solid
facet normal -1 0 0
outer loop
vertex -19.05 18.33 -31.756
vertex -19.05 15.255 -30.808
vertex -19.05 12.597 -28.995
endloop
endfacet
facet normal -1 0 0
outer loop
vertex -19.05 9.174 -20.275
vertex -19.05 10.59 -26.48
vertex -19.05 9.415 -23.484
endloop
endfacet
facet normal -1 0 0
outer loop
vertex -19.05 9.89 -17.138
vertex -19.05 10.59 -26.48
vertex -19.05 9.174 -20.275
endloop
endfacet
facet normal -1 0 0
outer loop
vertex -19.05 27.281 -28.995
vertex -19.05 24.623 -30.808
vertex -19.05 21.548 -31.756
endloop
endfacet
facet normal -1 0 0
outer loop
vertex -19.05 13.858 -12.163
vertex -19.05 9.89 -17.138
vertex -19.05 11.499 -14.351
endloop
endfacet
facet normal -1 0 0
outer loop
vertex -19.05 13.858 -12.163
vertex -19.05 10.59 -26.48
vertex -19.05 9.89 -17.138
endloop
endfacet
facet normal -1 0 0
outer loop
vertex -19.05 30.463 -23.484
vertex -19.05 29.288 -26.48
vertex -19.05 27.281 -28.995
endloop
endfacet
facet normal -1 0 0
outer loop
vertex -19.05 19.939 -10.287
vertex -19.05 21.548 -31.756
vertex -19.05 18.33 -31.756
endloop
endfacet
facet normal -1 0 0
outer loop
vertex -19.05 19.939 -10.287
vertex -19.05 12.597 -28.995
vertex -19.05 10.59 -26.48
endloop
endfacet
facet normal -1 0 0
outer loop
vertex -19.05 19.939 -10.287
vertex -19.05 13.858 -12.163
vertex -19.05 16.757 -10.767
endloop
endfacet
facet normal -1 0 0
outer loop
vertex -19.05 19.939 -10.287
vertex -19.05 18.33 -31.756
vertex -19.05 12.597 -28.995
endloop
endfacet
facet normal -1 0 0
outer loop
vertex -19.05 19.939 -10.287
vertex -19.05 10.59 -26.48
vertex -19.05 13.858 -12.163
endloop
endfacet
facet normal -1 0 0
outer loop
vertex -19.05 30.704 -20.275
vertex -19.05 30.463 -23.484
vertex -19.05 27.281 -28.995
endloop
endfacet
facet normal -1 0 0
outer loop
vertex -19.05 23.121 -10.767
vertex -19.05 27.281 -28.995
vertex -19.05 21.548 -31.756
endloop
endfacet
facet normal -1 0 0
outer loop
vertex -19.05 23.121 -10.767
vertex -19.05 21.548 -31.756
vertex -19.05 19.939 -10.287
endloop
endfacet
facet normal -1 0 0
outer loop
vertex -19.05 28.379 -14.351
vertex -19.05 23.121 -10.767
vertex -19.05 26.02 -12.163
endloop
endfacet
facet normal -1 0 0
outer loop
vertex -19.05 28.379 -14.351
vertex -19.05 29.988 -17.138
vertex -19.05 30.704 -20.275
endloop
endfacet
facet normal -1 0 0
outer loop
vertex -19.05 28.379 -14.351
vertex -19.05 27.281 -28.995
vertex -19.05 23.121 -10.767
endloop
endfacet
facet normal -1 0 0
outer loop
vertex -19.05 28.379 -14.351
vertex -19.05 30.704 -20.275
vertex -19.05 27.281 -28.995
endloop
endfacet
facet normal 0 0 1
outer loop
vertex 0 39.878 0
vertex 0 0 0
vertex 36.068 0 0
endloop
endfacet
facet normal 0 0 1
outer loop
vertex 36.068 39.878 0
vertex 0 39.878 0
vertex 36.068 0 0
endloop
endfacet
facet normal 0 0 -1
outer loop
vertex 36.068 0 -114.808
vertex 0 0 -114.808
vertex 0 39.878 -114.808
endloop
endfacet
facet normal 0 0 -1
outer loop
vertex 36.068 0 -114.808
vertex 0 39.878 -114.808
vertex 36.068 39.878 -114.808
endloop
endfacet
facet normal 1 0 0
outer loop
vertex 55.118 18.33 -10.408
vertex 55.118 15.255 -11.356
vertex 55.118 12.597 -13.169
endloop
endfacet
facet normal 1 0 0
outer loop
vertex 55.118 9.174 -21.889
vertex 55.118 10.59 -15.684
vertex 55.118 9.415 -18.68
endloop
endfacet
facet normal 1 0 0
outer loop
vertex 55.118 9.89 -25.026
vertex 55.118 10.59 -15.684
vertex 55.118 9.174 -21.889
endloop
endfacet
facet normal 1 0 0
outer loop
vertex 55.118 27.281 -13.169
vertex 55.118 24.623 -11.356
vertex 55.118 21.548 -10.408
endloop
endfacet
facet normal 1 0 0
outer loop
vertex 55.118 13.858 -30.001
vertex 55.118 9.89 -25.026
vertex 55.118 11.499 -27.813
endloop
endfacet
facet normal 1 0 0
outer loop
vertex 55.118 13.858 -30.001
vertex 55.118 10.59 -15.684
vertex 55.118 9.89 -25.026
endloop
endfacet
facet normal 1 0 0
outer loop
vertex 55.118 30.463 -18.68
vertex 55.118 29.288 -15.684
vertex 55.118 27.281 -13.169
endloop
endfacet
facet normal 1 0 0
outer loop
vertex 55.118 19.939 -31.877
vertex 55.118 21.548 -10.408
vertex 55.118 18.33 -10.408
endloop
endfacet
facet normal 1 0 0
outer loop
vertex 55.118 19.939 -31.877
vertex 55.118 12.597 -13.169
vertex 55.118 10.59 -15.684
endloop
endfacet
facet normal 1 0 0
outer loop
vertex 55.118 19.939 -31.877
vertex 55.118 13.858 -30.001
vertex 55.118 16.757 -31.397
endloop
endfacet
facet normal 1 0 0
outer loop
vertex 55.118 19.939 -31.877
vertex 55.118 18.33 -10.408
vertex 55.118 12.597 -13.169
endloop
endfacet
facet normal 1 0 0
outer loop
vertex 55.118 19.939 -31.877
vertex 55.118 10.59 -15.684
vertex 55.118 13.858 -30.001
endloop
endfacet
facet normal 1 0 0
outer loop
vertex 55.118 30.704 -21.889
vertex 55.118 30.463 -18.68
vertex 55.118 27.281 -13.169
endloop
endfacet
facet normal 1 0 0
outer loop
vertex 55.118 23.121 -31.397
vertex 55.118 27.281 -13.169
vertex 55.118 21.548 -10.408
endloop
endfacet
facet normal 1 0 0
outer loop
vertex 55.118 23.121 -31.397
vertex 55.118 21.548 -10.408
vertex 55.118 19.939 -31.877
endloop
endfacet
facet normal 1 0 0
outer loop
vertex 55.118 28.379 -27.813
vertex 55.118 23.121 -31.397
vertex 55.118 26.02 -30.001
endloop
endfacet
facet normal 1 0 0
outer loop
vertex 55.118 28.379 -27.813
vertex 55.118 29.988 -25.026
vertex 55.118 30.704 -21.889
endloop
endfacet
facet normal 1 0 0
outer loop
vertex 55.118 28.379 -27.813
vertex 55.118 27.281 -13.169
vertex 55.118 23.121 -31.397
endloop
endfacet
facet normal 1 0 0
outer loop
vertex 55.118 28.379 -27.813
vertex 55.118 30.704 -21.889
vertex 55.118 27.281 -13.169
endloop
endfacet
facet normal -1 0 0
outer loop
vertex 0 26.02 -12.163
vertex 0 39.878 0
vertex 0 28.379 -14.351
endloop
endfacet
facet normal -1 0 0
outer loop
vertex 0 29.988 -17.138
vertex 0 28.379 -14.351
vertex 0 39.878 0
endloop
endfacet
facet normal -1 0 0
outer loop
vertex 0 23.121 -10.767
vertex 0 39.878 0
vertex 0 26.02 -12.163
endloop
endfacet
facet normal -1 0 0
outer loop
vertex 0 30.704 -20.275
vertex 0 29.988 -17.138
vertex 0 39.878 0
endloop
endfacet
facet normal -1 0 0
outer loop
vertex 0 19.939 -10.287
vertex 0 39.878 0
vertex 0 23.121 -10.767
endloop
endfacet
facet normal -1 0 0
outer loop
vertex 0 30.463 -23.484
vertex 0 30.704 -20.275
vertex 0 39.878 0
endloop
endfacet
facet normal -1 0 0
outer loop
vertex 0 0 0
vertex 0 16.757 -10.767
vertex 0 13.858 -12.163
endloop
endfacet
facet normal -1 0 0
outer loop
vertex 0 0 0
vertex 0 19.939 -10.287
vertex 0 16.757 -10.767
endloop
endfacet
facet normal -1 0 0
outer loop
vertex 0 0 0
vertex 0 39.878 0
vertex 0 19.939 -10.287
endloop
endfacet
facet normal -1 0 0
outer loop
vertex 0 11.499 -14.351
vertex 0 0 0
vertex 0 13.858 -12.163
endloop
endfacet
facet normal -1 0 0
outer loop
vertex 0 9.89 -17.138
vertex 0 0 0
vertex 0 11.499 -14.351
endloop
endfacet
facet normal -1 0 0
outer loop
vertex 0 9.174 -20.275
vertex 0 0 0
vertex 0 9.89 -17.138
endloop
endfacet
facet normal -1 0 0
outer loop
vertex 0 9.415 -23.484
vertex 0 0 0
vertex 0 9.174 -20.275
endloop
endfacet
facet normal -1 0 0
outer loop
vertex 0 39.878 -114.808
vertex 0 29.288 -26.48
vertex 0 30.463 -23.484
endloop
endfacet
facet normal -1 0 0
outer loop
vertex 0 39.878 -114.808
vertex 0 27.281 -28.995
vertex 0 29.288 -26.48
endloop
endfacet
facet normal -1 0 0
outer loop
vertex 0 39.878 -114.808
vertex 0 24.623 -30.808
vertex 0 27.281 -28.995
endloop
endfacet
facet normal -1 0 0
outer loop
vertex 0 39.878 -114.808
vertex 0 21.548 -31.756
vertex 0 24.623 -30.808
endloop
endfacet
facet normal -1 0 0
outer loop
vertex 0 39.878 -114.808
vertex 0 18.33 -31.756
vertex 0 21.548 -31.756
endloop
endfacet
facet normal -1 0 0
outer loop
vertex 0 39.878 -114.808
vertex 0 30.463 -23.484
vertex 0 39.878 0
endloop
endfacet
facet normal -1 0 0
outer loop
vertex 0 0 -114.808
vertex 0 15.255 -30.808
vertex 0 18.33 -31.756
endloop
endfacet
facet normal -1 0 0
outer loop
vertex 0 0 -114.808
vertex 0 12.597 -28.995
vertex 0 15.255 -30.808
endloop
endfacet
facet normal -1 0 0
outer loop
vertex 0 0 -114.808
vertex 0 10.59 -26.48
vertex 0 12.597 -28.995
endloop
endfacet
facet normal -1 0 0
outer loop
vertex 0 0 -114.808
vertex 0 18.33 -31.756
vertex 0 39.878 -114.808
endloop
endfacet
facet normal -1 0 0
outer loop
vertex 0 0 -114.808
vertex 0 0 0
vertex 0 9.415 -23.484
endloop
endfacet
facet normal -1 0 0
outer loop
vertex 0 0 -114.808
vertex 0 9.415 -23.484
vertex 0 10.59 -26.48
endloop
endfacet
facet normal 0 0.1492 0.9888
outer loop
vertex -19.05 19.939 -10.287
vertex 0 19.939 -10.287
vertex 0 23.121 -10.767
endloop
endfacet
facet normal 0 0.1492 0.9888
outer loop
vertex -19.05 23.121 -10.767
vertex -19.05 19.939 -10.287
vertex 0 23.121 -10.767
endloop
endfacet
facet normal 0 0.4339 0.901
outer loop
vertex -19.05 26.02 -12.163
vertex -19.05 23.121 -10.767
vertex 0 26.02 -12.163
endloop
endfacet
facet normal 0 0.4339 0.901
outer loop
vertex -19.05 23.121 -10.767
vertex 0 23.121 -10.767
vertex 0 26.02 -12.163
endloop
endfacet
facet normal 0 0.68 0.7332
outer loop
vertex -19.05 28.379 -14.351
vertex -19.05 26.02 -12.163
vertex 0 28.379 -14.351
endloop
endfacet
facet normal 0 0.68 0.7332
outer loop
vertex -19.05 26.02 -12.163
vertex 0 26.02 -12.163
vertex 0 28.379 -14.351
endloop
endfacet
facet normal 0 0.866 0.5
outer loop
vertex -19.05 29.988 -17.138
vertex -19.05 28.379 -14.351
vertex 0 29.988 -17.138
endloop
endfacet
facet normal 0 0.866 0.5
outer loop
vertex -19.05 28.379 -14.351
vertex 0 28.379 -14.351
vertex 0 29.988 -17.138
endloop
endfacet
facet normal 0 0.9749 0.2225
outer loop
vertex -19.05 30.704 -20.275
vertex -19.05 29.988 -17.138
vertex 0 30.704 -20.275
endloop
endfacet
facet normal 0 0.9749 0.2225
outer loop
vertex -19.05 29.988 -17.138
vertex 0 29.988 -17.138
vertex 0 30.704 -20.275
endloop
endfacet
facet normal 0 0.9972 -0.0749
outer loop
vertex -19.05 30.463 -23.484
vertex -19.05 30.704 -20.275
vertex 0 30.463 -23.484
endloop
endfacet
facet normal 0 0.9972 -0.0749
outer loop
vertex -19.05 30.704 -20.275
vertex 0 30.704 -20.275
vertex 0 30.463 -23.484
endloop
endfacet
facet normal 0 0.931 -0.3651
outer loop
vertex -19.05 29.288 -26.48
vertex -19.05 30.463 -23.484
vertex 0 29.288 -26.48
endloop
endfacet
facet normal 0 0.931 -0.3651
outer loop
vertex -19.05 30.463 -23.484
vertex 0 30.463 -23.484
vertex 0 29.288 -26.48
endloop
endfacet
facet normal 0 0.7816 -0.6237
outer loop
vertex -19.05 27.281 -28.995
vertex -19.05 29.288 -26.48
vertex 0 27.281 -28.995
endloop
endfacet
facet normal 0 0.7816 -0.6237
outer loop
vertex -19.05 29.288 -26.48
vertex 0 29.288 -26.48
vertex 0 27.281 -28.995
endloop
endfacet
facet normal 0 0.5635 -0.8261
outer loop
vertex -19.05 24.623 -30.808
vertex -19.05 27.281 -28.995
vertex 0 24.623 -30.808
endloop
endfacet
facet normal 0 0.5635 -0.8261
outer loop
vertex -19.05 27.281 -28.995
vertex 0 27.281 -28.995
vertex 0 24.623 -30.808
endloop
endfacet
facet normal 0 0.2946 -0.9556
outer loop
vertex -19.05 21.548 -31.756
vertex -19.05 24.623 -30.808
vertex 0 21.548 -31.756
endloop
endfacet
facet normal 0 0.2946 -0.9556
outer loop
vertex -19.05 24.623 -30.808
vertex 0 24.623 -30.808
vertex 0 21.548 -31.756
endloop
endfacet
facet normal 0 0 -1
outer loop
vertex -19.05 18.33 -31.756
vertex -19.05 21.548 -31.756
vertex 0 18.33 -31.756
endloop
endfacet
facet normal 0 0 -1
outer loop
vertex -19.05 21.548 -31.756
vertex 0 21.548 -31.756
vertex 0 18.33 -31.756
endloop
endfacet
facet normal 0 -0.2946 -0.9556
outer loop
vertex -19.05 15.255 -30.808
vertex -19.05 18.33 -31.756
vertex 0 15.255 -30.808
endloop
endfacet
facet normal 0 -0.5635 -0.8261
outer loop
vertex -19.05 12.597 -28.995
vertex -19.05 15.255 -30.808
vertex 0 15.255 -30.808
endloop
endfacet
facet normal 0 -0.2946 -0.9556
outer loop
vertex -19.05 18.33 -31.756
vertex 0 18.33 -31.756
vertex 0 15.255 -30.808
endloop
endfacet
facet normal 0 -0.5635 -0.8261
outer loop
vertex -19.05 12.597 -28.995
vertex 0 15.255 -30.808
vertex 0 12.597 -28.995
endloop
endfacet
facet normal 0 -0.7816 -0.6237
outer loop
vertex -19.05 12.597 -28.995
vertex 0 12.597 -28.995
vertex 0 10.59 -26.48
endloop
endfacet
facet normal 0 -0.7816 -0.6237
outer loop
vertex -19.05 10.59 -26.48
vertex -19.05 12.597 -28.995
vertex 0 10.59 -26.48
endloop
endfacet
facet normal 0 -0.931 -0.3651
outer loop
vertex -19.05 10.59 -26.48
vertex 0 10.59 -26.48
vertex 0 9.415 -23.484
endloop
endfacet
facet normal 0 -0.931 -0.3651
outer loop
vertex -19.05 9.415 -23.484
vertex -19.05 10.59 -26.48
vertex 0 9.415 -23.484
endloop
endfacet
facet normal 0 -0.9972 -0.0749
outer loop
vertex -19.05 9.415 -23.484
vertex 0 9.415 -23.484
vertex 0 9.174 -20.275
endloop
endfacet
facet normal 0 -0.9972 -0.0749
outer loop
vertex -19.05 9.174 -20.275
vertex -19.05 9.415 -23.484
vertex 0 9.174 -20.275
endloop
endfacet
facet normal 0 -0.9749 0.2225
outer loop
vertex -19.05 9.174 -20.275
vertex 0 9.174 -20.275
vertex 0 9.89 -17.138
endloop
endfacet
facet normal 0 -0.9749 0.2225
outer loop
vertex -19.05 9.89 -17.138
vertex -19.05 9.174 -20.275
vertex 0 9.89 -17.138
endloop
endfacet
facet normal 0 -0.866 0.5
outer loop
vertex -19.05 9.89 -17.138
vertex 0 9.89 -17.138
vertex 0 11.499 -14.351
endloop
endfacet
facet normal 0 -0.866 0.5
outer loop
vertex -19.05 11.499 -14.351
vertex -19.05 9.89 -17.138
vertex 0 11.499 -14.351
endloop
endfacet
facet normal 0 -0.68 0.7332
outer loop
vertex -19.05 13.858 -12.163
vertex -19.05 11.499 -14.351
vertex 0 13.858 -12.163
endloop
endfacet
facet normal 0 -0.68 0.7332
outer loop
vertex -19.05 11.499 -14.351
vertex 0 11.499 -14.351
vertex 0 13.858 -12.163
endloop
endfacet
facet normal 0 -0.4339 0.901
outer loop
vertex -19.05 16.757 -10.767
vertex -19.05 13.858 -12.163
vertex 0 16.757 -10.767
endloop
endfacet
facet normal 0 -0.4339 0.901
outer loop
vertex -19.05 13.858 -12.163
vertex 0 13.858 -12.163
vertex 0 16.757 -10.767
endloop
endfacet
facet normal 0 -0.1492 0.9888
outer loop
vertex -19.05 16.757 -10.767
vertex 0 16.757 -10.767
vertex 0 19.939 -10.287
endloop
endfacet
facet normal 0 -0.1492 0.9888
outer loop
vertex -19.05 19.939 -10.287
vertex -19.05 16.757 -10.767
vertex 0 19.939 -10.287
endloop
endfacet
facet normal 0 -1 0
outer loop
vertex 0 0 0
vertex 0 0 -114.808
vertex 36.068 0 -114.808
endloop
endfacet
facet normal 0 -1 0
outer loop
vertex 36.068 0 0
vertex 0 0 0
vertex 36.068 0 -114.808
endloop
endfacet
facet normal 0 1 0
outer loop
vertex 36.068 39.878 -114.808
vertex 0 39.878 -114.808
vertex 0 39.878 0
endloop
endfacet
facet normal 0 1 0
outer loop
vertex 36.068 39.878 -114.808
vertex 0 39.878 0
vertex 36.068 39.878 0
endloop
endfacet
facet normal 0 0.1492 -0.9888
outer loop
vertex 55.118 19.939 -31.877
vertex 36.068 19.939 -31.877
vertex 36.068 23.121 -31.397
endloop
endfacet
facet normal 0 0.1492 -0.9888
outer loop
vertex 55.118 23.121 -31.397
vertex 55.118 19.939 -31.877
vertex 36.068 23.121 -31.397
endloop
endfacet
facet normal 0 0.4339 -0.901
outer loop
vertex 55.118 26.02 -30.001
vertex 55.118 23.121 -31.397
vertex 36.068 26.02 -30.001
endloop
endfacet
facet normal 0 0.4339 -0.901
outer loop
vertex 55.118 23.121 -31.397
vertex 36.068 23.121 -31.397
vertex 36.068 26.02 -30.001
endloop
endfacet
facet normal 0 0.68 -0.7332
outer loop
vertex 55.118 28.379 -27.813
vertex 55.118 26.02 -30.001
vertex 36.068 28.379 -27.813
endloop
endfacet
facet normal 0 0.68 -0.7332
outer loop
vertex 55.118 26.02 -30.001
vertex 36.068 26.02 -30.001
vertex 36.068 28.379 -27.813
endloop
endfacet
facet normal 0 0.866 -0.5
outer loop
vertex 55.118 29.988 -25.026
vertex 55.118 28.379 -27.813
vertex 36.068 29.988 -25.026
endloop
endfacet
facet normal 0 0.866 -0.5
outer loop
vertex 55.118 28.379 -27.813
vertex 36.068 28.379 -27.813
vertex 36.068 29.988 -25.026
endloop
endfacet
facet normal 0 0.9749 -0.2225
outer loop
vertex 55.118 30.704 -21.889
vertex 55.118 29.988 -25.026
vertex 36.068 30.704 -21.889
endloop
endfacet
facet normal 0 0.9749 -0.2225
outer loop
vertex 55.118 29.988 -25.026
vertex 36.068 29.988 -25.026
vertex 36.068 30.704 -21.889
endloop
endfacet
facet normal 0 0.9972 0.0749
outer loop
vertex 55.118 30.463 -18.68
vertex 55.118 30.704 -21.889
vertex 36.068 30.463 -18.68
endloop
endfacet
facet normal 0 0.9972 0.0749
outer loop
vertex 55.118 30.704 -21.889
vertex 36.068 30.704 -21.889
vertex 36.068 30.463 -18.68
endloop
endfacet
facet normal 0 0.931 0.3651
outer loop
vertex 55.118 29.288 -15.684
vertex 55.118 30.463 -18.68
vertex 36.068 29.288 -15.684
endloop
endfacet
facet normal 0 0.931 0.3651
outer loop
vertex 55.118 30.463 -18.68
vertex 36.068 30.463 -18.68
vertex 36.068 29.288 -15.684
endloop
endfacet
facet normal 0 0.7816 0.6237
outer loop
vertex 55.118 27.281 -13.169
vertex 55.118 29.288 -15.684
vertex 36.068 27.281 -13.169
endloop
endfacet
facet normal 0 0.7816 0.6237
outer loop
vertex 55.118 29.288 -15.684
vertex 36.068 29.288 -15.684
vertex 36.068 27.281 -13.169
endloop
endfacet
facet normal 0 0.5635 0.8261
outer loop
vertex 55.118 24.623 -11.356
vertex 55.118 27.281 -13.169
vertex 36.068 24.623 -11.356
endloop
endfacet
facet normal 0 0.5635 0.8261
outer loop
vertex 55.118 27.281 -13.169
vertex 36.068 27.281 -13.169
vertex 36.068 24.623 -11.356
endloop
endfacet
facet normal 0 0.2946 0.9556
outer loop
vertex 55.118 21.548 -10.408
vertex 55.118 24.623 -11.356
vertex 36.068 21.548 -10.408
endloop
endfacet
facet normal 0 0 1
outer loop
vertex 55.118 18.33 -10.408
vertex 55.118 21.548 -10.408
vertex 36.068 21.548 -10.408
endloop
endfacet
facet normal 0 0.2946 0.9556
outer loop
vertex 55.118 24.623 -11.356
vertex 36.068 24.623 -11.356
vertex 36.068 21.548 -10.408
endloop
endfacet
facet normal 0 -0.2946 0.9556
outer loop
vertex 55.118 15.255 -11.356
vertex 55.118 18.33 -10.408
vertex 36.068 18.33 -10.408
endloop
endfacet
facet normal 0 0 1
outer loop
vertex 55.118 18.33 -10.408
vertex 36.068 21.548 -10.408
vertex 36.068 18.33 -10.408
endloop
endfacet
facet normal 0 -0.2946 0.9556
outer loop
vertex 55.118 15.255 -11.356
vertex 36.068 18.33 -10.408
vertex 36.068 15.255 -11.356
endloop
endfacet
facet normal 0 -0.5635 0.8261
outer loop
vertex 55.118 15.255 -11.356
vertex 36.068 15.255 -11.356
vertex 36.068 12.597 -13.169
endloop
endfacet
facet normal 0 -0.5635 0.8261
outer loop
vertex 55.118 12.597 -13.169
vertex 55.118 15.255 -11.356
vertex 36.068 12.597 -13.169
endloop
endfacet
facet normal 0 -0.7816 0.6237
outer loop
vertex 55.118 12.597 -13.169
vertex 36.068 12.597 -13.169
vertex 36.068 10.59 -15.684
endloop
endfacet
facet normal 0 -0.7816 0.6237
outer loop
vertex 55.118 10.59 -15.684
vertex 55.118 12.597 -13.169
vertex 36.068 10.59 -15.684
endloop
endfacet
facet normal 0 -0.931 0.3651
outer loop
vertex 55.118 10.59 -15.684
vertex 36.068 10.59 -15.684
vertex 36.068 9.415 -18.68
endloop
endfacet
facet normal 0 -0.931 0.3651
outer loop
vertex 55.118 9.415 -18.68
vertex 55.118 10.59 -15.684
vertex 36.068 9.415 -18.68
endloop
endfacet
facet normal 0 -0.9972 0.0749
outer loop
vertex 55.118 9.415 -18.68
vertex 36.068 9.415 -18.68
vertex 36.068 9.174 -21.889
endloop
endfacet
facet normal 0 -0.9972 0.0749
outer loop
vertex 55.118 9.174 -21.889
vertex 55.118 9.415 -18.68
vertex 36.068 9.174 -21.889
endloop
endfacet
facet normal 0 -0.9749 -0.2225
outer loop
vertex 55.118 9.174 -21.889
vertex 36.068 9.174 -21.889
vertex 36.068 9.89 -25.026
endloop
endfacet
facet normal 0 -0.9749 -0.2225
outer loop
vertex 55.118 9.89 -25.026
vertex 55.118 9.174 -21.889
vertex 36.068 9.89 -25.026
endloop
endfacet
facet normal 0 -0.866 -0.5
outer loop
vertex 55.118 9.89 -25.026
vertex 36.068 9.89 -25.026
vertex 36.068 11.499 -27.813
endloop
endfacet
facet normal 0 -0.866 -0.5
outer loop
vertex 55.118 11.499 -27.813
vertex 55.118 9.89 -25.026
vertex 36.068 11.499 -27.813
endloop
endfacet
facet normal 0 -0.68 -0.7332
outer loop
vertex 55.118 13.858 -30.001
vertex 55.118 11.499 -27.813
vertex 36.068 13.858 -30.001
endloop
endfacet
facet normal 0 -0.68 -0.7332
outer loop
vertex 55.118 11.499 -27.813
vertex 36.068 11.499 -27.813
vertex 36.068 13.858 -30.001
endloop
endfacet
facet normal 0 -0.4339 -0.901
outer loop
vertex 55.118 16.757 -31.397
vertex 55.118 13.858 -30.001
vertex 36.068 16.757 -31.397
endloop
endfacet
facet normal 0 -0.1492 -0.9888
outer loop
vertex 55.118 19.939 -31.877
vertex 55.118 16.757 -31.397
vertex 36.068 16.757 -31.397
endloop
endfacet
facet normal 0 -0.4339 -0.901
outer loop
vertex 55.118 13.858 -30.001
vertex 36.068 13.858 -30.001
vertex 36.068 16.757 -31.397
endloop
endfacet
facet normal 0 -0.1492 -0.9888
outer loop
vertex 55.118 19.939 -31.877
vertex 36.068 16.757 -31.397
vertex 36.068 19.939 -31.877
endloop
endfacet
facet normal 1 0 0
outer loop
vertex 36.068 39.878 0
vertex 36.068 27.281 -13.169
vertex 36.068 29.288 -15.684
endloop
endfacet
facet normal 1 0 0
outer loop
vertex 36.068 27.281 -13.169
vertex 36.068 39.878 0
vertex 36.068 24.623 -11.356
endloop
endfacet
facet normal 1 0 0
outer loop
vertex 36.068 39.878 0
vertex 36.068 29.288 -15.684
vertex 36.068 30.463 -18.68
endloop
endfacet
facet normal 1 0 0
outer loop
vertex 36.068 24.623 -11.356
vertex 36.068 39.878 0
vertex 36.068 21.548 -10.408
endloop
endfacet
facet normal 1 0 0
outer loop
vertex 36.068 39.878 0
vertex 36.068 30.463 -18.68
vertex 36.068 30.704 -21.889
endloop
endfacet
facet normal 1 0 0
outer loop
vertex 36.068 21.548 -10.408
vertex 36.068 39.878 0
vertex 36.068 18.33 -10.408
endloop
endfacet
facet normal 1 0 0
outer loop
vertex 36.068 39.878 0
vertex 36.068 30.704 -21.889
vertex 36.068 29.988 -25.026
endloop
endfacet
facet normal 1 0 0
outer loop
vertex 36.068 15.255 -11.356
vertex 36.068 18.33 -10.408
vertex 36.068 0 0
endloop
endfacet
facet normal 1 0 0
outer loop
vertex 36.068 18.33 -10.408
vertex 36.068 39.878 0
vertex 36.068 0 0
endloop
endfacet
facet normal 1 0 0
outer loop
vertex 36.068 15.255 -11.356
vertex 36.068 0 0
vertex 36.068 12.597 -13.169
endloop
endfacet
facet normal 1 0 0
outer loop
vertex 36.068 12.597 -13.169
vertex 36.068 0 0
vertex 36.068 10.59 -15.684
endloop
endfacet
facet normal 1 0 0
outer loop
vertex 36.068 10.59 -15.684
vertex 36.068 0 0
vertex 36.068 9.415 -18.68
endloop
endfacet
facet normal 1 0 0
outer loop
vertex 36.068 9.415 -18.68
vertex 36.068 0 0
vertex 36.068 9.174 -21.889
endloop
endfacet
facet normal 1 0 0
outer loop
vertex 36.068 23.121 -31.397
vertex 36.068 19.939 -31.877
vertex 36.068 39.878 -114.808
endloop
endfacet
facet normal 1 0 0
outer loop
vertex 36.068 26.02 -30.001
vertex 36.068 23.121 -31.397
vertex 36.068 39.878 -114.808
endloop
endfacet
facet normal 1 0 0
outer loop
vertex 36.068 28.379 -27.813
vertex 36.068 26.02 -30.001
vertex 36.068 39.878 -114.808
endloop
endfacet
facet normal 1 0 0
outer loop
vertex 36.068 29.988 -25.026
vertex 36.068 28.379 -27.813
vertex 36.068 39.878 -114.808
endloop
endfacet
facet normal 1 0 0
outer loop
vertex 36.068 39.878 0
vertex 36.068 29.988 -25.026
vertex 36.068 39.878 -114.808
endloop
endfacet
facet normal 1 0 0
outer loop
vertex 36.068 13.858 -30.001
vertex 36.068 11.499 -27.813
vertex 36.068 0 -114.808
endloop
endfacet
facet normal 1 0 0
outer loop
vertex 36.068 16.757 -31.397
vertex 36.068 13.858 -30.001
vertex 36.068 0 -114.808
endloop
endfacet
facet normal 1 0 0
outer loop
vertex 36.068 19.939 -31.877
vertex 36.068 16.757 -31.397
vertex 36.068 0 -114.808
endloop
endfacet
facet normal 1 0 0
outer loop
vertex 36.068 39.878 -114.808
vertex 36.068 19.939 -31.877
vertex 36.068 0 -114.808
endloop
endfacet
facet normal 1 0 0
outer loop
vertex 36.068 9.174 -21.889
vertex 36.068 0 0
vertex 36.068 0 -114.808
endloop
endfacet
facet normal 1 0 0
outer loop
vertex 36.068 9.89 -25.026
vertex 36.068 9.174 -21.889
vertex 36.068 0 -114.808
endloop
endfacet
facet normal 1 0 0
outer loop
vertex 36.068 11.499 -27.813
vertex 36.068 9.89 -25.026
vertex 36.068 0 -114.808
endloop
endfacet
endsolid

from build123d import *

# Parameters (mm, degrees)
SKETCH1_W           = 36.068
SKETCH1_H           = 114.808
BOSS_EXTRUDE1_DEPTH = 39.878
SKETCH3_R           = 10.795
BOSS_EXTRUDE2_DEPTH = 19.05
SKETCH4_R           = 10.795
BOSS_EXTRUDE4_DEPTH = 19.05


with BuildPart() as part:
    # Sketch1 → Boss-Extrude1 (new body)
    with BuildSketch(Plane(origin=(0, 0, 0), x_dir=(1, 0, 0), z_dir=(0, 1, 0))):
        with Locations((18.034, 57.404)):
            Rectangle(SKETCH1_W, SKETCH1_H)
    extrude(amount=BOSS_EXTRUDE1_DEPTH)

    # Sketch3 → Boss-Extrude2 (add)
    with BuildSketch(Plane.ZY):
        with Locations((-21.082, 19.939)):
            Circle(SKETCH3_R)
    extrude(amount=BOSS_EXTRUDE2_DEPTH)

    # Sketch4 → Boss-Extrude4 (add)
    with BuildSketch(Plane(origin=(36.068, 0, 0), x_dir=(0, 0, -1), z_dir=(1, 0, 0))):
        with Locations((21.082, 19.939)):
            Circle(SKETCH4_R)
    extrude(amount=BOSS_EXTRUDE4_DEPTH)


solid = part.part
